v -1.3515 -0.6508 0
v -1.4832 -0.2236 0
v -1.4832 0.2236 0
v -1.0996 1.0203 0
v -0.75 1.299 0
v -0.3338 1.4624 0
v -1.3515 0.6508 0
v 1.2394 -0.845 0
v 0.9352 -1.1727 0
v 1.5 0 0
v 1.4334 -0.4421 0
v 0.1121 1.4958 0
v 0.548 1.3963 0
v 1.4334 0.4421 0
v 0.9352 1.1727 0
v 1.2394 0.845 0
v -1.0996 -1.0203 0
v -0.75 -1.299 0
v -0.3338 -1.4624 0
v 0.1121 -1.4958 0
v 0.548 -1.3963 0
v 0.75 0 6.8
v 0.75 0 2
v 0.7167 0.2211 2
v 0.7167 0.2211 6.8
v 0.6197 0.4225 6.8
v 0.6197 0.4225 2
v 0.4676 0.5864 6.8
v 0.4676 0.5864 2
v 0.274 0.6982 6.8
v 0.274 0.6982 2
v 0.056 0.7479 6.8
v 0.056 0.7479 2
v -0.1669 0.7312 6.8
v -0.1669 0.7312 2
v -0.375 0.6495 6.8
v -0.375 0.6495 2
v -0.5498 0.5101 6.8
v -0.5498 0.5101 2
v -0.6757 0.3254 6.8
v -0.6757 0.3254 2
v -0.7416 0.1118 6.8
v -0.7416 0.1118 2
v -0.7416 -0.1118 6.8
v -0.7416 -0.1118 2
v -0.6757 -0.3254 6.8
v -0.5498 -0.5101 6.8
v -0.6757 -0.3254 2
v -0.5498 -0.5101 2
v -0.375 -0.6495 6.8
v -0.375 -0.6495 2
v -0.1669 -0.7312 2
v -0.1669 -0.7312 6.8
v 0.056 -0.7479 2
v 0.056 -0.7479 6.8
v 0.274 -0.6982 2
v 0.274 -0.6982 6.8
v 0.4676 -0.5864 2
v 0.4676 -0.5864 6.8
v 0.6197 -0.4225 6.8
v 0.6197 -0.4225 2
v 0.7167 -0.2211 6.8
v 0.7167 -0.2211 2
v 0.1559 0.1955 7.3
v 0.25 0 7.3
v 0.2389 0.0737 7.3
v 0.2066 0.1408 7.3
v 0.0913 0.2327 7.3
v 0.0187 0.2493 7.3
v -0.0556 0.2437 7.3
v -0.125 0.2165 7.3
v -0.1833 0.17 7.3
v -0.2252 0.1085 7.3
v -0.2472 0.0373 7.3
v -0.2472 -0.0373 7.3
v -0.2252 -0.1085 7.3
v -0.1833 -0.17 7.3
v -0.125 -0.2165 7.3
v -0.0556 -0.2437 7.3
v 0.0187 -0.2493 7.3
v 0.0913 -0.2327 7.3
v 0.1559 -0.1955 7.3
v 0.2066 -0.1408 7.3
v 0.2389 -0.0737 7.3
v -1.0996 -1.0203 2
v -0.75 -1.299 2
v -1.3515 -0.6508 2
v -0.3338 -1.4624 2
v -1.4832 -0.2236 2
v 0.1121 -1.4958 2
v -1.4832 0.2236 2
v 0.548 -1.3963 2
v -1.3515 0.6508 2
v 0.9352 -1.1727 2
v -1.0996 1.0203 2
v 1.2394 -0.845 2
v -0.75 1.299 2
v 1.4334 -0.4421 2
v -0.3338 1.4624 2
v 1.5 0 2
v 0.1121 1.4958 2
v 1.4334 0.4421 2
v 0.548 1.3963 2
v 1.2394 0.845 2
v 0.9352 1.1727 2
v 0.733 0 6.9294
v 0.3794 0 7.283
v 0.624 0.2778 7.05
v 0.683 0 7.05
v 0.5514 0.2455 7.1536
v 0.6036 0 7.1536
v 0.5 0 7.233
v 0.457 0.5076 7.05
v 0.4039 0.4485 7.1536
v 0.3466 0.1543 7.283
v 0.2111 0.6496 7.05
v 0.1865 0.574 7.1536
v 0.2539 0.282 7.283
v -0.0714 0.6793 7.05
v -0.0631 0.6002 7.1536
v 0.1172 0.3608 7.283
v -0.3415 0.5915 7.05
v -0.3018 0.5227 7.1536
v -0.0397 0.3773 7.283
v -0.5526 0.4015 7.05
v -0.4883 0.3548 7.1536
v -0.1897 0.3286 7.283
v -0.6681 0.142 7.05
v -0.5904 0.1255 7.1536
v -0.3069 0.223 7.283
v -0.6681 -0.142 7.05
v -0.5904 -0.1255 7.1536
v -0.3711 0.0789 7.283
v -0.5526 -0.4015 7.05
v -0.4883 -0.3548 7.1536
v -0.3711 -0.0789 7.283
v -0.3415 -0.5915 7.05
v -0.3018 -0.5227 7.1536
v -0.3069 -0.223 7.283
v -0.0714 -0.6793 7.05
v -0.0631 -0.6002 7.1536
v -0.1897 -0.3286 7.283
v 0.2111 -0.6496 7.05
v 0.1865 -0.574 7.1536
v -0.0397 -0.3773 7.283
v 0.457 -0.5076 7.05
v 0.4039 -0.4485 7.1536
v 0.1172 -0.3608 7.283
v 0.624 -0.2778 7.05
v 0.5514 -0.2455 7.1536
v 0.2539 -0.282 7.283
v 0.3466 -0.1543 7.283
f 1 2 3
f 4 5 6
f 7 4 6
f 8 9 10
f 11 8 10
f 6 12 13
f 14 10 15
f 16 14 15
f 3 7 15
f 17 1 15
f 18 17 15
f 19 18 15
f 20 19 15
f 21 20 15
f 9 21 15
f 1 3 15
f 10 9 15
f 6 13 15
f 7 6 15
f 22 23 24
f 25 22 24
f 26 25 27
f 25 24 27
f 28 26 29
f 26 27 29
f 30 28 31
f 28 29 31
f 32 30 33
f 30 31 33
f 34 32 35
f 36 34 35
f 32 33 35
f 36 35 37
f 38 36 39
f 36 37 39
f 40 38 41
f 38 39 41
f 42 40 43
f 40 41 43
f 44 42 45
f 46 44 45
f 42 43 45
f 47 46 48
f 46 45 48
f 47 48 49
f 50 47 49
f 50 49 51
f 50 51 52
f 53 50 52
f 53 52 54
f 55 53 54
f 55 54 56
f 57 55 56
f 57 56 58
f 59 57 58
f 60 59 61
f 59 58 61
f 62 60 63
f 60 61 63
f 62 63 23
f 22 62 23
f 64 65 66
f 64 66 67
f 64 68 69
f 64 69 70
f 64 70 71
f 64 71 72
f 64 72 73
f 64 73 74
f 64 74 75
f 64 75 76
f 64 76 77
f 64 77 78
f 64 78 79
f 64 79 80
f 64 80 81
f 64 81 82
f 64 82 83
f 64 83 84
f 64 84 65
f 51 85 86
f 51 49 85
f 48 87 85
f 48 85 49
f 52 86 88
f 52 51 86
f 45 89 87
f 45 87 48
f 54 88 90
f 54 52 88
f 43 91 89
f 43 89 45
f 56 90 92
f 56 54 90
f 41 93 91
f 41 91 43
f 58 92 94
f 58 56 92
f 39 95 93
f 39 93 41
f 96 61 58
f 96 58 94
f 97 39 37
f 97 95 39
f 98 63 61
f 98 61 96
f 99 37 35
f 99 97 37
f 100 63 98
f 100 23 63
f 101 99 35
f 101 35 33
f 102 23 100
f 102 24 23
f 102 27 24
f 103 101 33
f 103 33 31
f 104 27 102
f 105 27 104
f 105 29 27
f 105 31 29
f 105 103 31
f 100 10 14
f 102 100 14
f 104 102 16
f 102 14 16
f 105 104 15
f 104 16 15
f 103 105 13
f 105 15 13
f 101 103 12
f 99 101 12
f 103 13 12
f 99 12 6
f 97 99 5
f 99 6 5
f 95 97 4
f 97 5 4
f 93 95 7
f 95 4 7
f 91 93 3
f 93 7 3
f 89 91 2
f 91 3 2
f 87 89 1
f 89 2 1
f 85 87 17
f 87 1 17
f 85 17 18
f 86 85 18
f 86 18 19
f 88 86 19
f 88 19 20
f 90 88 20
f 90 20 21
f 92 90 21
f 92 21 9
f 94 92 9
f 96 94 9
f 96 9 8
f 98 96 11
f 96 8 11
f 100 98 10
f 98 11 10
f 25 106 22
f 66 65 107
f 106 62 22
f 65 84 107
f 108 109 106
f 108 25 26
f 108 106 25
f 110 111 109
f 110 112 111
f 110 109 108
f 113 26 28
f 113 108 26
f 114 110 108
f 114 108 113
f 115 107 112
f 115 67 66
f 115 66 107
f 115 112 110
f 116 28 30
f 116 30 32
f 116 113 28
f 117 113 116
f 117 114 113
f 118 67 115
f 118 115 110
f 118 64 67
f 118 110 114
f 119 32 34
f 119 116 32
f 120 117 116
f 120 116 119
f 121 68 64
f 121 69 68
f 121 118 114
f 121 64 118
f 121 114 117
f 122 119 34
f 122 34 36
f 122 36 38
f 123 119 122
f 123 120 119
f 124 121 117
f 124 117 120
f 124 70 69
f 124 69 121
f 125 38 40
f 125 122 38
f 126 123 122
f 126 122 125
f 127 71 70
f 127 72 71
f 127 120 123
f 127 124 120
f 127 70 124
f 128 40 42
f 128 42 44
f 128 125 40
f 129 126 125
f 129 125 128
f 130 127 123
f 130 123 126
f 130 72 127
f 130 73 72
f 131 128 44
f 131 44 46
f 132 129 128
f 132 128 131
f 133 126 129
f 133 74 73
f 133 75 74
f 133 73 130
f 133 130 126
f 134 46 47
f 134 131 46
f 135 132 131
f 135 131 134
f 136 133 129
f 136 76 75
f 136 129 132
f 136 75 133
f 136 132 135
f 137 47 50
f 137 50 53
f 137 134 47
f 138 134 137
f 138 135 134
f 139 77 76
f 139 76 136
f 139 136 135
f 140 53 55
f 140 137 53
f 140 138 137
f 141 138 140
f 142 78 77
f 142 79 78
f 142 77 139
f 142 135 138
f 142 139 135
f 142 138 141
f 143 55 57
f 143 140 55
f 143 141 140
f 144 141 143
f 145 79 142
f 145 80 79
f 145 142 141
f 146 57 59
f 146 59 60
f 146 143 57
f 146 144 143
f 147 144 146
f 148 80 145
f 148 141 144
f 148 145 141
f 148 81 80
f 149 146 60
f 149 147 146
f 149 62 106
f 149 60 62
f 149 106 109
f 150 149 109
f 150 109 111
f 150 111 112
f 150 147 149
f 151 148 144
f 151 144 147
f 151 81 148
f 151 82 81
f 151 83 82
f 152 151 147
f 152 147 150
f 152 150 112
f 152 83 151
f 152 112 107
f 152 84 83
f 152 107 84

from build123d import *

# Parameters (mm, degrees)
SKETCH1_R           = 1.5
BOSS_EXTRUDE1_DEPTH = 2
SKETCH2_R           = 0.75
BOSS_EXTRUDE2_DEPTH = 5.3
FILLET1_R           = 0.5


with BuildPart() as part:
    # Sketch1 → Boss-Extrude1 (new body)
    with BuildSketch(Plane.XY):
        Circle(SKETCH1_R)
    extrude(amount=BOSS_EXTRUDE1_DEPTH)

    # Sketch2 → Boss-Extrude2 (add)
    with BuildSketch(Plane.XY.offset(2)):
        Circle(SKETCH2_R)
    extrude(amount=BOSS_EXTRUDE2_DEPTH)

    # Fillet1
    fillet1_edges = [part.edges().sort_by_distance(p)[0] for p in [
        (-0.75, 0, 7.3),
    ]]
    fillet(fillet1_edges, radius=FILLET1_R)


solid = part.part
